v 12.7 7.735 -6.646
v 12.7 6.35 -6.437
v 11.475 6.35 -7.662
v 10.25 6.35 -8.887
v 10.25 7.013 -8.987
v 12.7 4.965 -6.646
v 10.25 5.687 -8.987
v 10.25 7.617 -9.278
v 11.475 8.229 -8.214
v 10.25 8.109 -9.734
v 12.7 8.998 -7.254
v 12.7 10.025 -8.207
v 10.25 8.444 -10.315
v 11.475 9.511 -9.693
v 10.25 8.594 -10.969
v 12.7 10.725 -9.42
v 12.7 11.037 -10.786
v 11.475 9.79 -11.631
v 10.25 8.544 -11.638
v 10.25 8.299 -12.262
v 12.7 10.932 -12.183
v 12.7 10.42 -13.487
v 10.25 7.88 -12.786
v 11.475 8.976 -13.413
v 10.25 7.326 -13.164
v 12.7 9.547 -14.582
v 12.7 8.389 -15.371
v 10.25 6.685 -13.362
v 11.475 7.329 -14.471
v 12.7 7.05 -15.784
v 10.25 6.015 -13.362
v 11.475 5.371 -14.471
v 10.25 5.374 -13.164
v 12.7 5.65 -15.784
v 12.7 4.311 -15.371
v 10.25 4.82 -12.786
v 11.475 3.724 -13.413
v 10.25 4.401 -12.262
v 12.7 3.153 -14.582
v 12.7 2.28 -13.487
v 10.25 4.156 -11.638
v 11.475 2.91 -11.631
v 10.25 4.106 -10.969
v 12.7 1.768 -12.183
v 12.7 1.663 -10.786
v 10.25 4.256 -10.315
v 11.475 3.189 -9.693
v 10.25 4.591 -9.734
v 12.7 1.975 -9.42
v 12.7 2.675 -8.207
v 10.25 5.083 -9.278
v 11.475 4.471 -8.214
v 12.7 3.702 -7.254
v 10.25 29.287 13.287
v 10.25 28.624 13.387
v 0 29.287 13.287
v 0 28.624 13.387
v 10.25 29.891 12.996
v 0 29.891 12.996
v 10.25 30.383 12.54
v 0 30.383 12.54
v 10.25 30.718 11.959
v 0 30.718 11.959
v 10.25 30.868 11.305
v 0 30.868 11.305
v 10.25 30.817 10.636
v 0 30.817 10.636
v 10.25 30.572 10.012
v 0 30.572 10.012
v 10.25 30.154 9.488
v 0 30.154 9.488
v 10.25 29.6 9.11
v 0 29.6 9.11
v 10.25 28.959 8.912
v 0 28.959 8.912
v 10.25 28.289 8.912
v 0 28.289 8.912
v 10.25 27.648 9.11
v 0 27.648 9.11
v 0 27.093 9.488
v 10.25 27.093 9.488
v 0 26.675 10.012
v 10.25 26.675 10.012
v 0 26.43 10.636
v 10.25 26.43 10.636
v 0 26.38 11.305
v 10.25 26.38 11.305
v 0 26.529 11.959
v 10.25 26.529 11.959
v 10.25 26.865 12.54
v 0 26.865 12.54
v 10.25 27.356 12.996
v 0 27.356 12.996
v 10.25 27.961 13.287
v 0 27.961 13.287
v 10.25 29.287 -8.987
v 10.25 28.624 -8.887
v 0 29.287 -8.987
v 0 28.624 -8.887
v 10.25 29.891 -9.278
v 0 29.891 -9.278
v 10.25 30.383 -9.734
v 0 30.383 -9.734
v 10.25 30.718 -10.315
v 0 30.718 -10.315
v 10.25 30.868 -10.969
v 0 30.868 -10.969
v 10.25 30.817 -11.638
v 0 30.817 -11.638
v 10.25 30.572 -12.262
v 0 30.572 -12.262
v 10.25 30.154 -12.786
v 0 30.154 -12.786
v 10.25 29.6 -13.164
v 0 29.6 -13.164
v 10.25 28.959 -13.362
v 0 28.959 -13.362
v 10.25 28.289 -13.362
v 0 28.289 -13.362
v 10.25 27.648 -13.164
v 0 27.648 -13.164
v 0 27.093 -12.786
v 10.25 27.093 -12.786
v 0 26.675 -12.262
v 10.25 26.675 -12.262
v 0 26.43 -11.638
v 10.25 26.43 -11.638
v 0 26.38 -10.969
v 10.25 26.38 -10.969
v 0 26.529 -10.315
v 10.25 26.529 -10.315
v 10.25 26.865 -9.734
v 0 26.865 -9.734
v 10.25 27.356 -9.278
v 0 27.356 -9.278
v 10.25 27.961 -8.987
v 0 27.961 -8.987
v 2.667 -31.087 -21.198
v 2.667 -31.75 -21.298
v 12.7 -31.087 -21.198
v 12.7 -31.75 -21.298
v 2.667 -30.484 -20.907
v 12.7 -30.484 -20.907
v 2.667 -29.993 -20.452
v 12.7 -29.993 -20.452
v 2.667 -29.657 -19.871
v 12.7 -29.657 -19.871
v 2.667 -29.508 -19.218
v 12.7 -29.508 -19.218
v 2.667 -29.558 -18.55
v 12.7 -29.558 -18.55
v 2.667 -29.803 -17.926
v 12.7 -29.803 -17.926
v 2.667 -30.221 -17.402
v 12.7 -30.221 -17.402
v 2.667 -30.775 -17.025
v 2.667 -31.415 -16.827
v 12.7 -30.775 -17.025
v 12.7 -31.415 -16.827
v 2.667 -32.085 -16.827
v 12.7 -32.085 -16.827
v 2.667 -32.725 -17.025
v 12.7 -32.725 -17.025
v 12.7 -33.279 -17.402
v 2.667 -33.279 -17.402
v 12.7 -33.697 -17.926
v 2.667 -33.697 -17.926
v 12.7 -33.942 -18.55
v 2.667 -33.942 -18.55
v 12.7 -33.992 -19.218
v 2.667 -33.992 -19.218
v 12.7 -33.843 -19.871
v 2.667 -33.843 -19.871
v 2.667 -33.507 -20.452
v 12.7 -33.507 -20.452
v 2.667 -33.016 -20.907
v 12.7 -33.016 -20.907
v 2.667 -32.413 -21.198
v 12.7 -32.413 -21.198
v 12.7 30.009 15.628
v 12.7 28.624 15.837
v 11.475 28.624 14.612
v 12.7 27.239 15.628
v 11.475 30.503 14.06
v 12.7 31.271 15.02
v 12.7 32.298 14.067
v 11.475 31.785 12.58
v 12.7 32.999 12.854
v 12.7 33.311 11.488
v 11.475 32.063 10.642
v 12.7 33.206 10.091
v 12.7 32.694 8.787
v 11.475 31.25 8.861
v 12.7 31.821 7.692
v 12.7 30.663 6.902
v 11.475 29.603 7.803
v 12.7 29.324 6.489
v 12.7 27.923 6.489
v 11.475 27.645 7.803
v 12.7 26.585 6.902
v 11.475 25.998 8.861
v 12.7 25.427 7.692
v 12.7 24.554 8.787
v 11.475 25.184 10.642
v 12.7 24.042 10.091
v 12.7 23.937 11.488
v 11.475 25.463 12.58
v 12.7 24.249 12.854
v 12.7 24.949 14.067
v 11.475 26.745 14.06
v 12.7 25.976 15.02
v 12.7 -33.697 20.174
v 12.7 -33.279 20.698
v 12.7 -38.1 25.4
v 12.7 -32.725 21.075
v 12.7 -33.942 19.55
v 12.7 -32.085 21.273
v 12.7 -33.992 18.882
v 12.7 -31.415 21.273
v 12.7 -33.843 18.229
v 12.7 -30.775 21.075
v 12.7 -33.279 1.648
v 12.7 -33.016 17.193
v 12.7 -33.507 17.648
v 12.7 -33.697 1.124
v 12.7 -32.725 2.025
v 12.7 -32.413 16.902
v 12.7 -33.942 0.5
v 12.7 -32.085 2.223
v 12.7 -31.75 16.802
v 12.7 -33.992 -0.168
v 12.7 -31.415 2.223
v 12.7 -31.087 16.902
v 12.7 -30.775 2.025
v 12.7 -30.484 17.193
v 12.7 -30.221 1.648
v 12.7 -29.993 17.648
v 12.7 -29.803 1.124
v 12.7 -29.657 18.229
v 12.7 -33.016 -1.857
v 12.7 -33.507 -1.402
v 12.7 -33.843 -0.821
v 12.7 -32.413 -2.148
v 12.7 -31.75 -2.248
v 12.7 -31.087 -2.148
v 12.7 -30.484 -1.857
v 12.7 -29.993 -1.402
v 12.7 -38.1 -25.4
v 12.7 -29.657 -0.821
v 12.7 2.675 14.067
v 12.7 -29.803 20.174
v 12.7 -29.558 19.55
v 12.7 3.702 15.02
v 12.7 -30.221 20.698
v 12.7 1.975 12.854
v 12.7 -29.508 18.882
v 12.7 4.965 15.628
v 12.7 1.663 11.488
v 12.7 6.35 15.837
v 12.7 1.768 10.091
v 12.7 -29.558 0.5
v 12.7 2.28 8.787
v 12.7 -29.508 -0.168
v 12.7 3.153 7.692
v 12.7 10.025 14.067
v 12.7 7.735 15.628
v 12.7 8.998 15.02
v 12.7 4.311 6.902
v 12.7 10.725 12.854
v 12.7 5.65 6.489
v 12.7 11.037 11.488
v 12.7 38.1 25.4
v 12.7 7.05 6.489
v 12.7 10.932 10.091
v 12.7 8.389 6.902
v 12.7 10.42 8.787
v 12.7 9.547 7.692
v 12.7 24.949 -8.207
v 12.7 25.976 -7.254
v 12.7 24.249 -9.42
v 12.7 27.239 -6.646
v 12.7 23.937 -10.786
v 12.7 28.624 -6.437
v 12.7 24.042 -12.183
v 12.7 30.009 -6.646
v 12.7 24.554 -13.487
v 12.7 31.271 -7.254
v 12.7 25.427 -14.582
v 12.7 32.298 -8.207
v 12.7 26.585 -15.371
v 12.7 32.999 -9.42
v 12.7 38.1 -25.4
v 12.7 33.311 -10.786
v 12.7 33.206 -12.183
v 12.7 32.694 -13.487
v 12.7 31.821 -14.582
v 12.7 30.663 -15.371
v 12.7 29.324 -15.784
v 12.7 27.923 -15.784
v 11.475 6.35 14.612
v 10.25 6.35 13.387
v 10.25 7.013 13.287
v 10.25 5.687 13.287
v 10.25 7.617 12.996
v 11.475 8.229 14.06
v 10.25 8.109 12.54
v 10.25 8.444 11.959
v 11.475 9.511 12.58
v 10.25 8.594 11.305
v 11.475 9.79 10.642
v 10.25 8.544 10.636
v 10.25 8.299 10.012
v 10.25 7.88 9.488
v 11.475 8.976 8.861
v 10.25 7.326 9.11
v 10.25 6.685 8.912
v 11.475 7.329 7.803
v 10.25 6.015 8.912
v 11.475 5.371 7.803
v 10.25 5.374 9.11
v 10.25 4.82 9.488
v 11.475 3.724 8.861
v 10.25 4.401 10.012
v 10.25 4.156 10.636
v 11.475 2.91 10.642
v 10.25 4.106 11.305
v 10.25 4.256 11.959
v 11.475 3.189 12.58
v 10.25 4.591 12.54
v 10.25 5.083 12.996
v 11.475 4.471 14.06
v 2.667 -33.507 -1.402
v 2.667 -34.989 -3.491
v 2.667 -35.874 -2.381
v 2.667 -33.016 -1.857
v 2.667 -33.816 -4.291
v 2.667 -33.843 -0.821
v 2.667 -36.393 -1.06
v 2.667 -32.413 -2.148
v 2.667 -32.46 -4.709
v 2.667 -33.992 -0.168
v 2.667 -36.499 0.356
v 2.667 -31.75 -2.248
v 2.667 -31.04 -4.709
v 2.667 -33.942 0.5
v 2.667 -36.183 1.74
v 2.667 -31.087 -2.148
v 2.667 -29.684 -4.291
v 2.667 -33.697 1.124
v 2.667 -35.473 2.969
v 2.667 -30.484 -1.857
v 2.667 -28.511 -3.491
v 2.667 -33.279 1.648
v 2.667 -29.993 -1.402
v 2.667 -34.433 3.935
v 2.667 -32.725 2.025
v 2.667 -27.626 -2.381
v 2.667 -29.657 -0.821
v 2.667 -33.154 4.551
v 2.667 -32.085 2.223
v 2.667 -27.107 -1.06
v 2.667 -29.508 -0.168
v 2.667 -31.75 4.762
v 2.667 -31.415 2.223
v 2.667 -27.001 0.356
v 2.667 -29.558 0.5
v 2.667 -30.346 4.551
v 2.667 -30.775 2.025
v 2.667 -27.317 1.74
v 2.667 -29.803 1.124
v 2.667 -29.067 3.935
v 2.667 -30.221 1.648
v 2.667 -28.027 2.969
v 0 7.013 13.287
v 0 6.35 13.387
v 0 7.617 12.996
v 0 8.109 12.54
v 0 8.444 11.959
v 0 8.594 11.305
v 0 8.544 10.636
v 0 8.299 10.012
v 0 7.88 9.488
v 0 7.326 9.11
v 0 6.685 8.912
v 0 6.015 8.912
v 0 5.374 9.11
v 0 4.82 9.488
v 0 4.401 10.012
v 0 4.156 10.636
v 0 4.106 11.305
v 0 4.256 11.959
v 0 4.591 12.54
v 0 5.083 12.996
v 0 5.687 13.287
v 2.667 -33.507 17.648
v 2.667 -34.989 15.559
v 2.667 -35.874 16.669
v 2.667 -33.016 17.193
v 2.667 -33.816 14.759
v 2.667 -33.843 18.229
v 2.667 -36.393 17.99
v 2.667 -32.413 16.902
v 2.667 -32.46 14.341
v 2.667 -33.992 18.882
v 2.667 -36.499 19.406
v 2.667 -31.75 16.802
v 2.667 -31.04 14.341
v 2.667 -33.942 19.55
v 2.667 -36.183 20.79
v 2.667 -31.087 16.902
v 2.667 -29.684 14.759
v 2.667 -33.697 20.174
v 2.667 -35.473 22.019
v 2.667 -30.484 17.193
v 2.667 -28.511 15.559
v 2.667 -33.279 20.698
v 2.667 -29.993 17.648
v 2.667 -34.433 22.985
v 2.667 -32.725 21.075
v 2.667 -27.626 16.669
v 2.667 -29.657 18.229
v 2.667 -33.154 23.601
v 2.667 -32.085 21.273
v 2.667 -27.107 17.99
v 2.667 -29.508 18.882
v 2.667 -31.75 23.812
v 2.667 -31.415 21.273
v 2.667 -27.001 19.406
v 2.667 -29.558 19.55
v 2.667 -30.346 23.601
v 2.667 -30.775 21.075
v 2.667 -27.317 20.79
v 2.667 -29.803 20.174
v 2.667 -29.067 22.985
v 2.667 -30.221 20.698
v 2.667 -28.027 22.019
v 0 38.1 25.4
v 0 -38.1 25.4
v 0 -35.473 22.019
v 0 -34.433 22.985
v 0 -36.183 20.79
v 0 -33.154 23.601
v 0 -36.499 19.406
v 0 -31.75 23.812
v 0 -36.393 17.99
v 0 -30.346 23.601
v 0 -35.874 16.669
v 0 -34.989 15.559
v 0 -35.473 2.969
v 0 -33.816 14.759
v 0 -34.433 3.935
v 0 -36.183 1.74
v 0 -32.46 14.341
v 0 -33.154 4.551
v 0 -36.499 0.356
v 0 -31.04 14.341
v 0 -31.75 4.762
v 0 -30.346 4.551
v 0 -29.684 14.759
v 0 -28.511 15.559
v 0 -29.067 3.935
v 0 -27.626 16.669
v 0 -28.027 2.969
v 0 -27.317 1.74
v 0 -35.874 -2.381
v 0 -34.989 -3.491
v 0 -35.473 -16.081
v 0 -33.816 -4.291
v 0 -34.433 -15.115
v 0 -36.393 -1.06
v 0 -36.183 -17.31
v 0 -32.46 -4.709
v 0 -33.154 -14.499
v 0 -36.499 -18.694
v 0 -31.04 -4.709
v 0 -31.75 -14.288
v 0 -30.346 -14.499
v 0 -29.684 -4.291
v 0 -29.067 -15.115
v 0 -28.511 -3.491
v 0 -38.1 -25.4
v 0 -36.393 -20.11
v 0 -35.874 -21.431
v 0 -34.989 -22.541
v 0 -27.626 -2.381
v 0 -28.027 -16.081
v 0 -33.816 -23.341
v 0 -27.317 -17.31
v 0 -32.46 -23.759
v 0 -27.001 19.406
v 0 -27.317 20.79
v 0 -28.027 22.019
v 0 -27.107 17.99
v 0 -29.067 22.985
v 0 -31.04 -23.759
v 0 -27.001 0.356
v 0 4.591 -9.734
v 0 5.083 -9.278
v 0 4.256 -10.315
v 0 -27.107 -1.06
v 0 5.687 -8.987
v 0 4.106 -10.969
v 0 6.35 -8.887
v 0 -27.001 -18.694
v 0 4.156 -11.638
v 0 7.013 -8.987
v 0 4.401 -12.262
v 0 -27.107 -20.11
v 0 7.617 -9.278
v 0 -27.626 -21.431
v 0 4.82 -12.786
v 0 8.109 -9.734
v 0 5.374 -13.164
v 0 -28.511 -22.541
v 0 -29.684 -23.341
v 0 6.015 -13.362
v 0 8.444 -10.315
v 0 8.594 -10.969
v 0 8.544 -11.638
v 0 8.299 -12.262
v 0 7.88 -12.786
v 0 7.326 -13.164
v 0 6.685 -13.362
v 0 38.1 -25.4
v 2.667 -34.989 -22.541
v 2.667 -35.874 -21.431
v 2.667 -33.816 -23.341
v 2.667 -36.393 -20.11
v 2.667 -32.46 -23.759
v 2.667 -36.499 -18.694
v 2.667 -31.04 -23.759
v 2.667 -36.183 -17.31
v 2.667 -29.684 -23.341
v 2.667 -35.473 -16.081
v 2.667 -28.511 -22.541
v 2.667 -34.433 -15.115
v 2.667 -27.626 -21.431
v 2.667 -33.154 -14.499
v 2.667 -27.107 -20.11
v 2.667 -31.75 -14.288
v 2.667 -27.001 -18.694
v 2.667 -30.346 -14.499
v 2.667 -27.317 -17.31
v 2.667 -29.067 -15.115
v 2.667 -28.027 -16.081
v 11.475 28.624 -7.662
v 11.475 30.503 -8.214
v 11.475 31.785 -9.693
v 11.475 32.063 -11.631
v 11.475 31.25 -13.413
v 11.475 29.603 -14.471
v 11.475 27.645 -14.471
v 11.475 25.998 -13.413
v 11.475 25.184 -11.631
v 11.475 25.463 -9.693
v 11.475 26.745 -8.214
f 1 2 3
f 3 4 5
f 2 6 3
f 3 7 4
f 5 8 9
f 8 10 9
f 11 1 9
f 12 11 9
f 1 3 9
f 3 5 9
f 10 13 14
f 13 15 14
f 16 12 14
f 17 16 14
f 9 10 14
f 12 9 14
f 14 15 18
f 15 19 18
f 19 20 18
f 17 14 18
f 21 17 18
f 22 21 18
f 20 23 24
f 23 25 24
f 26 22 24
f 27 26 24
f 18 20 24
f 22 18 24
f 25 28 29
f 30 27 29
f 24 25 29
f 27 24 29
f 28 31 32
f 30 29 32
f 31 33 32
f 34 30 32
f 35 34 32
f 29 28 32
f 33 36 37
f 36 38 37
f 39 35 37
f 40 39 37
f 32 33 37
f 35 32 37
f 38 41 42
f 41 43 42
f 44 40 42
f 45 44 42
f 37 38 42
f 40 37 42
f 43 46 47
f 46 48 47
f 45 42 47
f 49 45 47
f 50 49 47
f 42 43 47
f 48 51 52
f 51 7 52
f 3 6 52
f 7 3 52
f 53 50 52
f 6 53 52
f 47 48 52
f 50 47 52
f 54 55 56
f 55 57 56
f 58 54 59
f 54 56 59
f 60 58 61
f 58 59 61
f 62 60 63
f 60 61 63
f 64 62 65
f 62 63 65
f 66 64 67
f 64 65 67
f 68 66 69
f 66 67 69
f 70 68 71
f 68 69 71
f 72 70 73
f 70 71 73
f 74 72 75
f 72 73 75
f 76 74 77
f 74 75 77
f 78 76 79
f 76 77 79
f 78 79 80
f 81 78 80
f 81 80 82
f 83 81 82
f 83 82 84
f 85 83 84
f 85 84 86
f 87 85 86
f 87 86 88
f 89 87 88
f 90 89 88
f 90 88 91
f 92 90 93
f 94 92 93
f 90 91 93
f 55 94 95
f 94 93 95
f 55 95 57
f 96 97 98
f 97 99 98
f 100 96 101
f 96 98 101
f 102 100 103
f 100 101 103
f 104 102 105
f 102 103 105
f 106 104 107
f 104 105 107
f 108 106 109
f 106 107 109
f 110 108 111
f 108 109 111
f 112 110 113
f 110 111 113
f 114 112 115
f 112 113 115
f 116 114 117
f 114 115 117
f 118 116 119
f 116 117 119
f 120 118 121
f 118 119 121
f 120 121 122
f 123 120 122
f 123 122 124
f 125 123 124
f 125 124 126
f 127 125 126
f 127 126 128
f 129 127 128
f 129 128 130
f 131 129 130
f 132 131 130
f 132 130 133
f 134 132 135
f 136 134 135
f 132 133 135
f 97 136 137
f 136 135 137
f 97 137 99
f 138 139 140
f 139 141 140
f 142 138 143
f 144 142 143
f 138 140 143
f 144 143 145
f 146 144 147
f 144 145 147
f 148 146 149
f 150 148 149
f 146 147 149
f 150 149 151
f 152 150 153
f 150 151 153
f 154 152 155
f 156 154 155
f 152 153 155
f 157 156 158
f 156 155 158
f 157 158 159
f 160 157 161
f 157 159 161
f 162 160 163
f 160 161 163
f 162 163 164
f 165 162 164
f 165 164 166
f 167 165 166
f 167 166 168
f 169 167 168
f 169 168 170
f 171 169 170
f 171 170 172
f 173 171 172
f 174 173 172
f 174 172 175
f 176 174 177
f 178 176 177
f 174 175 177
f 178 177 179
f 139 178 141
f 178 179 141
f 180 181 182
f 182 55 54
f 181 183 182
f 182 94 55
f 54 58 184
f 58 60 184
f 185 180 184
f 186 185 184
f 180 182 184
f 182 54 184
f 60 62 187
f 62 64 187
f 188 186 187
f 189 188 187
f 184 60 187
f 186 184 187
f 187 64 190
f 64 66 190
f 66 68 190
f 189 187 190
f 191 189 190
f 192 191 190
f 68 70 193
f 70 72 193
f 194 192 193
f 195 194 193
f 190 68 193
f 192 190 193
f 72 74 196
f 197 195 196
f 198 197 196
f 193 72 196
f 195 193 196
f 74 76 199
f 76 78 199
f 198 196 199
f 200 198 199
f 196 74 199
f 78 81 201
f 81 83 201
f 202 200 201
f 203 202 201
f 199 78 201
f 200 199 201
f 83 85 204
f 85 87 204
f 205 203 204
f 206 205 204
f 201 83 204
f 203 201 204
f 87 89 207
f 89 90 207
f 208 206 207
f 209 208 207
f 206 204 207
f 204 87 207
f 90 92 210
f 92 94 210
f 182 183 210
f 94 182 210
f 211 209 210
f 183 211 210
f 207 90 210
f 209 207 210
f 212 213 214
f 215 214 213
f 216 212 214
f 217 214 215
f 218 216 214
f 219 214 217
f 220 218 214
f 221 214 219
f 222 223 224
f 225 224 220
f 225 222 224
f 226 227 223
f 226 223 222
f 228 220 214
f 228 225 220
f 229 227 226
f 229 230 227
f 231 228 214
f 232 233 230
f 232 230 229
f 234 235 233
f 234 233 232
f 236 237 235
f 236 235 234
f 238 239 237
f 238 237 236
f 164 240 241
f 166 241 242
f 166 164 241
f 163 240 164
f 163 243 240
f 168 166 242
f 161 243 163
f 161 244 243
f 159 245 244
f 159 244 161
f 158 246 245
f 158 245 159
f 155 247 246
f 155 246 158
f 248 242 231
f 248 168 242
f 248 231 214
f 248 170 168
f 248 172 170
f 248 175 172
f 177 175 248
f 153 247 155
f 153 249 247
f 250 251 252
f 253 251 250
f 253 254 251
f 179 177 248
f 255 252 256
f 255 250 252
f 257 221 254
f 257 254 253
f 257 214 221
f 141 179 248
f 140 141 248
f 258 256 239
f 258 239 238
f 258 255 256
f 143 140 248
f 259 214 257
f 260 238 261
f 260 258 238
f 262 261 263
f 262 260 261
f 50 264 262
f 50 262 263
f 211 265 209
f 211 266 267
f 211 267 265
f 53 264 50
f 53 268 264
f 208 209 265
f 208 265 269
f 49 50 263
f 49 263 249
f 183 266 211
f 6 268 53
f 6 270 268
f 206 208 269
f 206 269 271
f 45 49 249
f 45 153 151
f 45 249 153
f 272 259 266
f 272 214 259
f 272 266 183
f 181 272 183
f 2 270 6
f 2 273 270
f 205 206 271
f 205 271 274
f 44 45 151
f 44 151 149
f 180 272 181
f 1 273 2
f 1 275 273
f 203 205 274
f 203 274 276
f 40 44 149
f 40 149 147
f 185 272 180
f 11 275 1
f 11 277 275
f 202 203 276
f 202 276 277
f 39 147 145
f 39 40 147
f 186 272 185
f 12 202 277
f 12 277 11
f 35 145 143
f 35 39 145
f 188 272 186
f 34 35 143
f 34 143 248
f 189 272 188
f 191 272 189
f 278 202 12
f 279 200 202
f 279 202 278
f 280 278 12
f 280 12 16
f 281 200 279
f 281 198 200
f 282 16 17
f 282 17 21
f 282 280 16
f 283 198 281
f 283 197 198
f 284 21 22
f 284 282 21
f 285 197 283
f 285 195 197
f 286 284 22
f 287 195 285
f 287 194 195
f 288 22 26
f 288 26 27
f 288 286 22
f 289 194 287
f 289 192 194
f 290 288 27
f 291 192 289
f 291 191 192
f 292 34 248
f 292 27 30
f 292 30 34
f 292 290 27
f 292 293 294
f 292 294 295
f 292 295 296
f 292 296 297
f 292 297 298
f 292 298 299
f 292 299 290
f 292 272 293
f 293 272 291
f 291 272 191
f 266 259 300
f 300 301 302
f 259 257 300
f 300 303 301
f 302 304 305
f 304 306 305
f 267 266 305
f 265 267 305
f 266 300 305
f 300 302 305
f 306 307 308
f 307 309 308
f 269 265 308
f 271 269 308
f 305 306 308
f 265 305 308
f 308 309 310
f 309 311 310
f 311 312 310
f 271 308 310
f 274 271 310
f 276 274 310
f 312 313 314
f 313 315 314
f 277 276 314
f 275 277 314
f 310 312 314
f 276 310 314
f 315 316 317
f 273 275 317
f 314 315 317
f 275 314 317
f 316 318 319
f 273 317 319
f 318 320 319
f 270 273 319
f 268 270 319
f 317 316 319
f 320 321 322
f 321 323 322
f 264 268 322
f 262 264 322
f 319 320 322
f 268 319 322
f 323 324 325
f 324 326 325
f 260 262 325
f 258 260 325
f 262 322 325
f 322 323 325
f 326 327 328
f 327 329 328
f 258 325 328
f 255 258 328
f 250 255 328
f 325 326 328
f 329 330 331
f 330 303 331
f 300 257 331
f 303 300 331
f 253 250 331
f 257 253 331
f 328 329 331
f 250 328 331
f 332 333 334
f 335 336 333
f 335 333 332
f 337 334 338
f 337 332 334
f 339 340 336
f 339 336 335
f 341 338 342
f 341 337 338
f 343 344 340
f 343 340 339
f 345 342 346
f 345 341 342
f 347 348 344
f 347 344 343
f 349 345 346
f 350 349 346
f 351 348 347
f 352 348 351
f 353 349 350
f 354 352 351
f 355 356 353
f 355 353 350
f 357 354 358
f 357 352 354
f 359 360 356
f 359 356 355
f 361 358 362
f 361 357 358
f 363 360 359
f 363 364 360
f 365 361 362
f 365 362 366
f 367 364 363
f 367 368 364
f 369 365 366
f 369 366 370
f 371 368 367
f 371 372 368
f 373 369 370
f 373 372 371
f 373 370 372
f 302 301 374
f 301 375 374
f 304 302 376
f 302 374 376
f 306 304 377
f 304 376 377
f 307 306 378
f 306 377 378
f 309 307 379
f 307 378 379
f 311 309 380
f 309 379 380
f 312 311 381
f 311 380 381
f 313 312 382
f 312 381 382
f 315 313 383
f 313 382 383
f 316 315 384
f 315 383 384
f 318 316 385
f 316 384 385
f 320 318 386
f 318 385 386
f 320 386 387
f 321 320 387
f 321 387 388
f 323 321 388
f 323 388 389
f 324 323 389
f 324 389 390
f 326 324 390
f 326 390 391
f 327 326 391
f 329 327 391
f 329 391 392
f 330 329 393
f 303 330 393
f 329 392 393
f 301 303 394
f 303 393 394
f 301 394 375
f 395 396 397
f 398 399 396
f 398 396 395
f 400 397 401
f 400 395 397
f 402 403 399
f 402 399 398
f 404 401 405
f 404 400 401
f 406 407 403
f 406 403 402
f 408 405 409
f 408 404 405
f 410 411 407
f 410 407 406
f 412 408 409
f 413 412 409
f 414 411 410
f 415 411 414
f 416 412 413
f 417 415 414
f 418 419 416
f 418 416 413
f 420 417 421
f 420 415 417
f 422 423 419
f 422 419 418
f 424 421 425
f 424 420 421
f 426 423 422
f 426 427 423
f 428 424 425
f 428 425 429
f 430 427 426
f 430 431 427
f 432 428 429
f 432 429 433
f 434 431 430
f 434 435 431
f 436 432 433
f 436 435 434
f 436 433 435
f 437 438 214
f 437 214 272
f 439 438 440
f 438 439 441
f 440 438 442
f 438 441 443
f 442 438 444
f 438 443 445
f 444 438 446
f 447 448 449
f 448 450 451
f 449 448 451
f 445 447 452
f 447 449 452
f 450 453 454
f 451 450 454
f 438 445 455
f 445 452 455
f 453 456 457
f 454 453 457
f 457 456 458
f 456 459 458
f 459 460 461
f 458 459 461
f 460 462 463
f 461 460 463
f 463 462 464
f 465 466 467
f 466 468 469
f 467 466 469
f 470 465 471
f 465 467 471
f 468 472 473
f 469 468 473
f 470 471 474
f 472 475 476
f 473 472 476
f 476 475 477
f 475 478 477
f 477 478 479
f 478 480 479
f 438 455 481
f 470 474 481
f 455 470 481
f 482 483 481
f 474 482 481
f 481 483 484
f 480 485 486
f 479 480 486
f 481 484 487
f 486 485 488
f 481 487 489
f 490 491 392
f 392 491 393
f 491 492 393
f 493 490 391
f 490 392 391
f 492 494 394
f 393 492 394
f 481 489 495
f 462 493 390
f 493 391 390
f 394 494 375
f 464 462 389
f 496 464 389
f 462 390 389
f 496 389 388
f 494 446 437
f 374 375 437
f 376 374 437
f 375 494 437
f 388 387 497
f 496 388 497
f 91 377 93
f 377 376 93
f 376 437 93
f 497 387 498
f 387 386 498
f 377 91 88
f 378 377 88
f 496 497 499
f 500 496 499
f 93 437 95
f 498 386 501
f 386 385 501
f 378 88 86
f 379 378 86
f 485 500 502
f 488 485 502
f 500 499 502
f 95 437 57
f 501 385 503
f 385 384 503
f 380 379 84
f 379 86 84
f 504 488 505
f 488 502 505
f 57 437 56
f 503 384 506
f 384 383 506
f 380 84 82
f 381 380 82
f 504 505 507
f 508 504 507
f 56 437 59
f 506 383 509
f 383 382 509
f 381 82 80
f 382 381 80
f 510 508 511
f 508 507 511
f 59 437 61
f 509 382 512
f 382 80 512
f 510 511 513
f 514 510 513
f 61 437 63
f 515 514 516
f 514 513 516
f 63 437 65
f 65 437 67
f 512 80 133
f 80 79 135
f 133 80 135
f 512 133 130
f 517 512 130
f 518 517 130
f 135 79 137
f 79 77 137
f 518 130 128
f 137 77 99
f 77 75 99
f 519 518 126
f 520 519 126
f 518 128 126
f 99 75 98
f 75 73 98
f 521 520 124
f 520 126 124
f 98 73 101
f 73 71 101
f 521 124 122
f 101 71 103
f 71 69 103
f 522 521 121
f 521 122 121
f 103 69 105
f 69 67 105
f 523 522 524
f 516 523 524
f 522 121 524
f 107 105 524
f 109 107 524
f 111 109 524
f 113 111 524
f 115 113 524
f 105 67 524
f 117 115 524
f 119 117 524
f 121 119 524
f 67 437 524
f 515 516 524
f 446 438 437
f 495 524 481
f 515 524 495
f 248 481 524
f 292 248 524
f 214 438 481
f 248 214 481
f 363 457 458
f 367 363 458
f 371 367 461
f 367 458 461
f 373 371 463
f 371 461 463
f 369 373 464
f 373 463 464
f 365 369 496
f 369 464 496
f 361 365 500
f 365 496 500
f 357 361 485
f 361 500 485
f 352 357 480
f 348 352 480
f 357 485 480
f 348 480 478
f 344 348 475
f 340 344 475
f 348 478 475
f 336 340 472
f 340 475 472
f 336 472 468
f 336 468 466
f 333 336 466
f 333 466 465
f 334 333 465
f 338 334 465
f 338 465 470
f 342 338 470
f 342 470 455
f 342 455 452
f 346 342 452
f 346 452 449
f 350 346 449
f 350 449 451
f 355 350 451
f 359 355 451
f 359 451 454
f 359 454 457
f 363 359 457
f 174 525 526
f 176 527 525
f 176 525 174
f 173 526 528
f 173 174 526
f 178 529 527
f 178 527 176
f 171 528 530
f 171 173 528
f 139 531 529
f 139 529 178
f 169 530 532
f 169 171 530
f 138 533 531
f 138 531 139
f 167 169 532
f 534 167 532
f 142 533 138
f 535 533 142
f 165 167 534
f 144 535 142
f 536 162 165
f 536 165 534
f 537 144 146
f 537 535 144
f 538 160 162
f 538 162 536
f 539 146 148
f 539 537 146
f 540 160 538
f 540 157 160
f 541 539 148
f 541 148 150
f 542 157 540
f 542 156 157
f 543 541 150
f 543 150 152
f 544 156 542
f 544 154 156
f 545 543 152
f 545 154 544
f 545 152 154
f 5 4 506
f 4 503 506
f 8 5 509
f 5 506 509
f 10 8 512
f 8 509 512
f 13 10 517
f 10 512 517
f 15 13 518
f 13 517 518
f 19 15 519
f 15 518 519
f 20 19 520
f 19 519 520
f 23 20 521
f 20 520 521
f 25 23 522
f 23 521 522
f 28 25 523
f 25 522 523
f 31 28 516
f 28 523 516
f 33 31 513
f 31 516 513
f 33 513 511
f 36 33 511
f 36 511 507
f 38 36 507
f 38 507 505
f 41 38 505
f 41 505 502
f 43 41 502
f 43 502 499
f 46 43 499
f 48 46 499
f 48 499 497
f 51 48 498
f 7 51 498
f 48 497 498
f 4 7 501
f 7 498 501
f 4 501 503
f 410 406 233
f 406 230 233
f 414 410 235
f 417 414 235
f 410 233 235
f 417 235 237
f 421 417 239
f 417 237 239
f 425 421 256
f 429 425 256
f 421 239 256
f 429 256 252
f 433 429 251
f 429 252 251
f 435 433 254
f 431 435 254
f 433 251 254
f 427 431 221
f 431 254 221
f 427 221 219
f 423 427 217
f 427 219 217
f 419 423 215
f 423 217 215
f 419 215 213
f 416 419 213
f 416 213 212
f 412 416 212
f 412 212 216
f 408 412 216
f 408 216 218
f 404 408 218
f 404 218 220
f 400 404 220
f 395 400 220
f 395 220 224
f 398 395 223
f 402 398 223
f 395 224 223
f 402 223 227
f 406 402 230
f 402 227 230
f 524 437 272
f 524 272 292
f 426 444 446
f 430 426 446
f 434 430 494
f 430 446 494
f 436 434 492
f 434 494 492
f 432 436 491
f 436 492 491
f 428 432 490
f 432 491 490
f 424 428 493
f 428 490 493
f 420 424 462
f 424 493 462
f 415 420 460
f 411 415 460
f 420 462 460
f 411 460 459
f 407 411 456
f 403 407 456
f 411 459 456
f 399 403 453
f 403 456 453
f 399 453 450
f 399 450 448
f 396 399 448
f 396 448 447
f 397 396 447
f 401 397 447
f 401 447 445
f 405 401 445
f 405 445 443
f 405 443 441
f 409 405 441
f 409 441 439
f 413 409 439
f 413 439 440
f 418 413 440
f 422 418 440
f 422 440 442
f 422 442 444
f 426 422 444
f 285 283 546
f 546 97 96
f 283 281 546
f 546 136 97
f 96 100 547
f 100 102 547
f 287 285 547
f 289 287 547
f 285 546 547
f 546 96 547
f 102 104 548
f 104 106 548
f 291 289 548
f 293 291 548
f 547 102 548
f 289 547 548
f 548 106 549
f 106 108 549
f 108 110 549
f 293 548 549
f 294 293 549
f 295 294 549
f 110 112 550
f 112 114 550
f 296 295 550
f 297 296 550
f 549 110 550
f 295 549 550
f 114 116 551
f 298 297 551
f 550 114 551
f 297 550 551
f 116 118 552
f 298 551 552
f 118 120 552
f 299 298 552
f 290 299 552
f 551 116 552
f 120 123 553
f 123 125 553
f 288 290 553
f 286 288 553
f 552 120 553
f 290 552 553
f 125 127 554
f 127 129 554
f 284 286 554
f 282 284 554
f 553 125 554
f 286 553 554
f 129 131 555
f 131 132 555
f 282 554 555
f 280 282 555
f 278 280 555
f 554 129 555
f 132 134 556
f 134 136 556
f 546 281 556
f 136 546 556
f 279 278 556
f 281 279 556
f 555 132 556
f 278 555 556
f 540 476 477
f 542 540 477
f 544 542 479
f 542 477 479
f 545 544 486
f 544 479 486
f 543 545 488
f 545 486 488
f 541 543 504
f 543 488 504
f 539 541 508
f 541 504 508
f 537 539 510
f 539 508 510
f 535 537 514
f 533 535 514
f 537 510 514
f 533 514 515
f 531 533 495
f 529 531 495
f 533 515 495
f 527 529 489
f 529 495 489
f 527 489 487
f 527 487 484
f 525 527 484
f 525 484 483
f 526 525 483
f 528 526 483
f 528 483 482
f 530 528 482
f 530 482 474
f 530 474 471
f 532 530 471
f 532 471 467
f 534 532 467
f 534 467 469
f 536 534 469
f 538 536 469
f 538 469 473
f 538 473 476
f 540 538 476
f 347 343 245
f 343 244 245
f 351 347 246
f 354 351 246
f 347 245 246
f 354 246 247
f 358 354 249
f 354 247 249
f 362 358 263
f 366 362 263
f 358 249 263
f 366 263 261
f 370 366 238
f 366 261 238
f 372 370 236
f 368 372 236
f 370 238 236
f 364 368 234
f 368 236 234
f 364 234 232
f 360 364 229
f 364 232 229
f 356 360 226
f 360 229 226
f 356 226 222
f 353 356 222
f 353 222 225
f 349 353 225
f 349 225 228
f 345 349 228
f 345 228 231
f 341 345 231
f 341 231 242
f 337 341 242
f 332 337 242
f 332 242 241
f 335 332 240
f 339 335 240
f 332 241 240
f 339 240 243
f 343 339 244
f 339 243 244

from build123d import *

# Parameters (mm, degrees)
SKETCH1_W                                           = 50.8
SKETCH1_H                                           = 76.2
BOSS_EXTRUDE1_DEPTH                                 = 12.7
CSK_FOR_M4_FLAT_HEAD_MACHINE_SCREW1_D               = 4.5
CSK_FOR_M4_FLAT_HEAD_MACHINE_SCREW1_CSINK_D         = 9.4
CSK_FOR_M4_FLAT_HEAD_MACHINE_SCREW1_CSINK_ANGLE     = 90
CBORE_FOR_8_BINDING_HEAD_MACHINE_SCREW1_D           = 4.4958
CBORE_FOR_8_BINDING_HEAD_MACHINE_SCREW1_CBORE_D     = 9.525
CBORE_FOR_8_BINDING_HEAD_MACHINE_SCREW1_CBORE_DEPTH = 2.667


with BuildPart() as part:
    # Sketch1 → Boss-Extrude1 (new body)
    with BuildSketch(Plane(origin=(0, 0, 0), x_dir=(0, 0, -1), z_dir=(1, 0, 0))):
        Rectangle(SKETCH1_W, SKETCH1_H)
    extrude(amount=BOSS_EXTRUDE1_DEPTH)

    # CSK for M4 Flat Head Machine Screw1 (through all)
    with Locations(Plane(origin=(12.7, 0, 0), x_dir=(0, 0, -1), z_dir=(1, 0, 0))):
        with Locations((11.136931804, 28.623863607), (-11.136931804, 28.623863607), (-11.136931804, 6.35), (11.136931804, 6.35)):
            CounterSinkHole(CSK_FOR_M4_FLAT_HEAD_MACHINE_SCREW1_D / 2, CSK_FOR_M4_FLAT_HEAD_MACHINE_SCREW1_CSINK_D / 2, counter_sink_angle=CSK_FOR_M4_FLAT_HEAD_MACHINE_SCREW1_CSINK_ANGLE)

    # CBORE for #8 Binding Head Machine Screw1 (through all)
    with Locations(Plane.ZY):
        with Locations((-19.05, -31.75), (0, -31.75), (19.05, -31.75)):
            CounterBoreHole(CBORE_FOR_8_BINDING_HEAD_MACHINE_SCREW1_D / 2, CBORE_FOR_8_BINDING_HEAD_MACHINE_SCREW1_CBORE_D / 2, CBORE_FOR_8_BINDING_HEAD_MACHINE_SCREW1_CBORE_DEPTH)


solid = part.part
